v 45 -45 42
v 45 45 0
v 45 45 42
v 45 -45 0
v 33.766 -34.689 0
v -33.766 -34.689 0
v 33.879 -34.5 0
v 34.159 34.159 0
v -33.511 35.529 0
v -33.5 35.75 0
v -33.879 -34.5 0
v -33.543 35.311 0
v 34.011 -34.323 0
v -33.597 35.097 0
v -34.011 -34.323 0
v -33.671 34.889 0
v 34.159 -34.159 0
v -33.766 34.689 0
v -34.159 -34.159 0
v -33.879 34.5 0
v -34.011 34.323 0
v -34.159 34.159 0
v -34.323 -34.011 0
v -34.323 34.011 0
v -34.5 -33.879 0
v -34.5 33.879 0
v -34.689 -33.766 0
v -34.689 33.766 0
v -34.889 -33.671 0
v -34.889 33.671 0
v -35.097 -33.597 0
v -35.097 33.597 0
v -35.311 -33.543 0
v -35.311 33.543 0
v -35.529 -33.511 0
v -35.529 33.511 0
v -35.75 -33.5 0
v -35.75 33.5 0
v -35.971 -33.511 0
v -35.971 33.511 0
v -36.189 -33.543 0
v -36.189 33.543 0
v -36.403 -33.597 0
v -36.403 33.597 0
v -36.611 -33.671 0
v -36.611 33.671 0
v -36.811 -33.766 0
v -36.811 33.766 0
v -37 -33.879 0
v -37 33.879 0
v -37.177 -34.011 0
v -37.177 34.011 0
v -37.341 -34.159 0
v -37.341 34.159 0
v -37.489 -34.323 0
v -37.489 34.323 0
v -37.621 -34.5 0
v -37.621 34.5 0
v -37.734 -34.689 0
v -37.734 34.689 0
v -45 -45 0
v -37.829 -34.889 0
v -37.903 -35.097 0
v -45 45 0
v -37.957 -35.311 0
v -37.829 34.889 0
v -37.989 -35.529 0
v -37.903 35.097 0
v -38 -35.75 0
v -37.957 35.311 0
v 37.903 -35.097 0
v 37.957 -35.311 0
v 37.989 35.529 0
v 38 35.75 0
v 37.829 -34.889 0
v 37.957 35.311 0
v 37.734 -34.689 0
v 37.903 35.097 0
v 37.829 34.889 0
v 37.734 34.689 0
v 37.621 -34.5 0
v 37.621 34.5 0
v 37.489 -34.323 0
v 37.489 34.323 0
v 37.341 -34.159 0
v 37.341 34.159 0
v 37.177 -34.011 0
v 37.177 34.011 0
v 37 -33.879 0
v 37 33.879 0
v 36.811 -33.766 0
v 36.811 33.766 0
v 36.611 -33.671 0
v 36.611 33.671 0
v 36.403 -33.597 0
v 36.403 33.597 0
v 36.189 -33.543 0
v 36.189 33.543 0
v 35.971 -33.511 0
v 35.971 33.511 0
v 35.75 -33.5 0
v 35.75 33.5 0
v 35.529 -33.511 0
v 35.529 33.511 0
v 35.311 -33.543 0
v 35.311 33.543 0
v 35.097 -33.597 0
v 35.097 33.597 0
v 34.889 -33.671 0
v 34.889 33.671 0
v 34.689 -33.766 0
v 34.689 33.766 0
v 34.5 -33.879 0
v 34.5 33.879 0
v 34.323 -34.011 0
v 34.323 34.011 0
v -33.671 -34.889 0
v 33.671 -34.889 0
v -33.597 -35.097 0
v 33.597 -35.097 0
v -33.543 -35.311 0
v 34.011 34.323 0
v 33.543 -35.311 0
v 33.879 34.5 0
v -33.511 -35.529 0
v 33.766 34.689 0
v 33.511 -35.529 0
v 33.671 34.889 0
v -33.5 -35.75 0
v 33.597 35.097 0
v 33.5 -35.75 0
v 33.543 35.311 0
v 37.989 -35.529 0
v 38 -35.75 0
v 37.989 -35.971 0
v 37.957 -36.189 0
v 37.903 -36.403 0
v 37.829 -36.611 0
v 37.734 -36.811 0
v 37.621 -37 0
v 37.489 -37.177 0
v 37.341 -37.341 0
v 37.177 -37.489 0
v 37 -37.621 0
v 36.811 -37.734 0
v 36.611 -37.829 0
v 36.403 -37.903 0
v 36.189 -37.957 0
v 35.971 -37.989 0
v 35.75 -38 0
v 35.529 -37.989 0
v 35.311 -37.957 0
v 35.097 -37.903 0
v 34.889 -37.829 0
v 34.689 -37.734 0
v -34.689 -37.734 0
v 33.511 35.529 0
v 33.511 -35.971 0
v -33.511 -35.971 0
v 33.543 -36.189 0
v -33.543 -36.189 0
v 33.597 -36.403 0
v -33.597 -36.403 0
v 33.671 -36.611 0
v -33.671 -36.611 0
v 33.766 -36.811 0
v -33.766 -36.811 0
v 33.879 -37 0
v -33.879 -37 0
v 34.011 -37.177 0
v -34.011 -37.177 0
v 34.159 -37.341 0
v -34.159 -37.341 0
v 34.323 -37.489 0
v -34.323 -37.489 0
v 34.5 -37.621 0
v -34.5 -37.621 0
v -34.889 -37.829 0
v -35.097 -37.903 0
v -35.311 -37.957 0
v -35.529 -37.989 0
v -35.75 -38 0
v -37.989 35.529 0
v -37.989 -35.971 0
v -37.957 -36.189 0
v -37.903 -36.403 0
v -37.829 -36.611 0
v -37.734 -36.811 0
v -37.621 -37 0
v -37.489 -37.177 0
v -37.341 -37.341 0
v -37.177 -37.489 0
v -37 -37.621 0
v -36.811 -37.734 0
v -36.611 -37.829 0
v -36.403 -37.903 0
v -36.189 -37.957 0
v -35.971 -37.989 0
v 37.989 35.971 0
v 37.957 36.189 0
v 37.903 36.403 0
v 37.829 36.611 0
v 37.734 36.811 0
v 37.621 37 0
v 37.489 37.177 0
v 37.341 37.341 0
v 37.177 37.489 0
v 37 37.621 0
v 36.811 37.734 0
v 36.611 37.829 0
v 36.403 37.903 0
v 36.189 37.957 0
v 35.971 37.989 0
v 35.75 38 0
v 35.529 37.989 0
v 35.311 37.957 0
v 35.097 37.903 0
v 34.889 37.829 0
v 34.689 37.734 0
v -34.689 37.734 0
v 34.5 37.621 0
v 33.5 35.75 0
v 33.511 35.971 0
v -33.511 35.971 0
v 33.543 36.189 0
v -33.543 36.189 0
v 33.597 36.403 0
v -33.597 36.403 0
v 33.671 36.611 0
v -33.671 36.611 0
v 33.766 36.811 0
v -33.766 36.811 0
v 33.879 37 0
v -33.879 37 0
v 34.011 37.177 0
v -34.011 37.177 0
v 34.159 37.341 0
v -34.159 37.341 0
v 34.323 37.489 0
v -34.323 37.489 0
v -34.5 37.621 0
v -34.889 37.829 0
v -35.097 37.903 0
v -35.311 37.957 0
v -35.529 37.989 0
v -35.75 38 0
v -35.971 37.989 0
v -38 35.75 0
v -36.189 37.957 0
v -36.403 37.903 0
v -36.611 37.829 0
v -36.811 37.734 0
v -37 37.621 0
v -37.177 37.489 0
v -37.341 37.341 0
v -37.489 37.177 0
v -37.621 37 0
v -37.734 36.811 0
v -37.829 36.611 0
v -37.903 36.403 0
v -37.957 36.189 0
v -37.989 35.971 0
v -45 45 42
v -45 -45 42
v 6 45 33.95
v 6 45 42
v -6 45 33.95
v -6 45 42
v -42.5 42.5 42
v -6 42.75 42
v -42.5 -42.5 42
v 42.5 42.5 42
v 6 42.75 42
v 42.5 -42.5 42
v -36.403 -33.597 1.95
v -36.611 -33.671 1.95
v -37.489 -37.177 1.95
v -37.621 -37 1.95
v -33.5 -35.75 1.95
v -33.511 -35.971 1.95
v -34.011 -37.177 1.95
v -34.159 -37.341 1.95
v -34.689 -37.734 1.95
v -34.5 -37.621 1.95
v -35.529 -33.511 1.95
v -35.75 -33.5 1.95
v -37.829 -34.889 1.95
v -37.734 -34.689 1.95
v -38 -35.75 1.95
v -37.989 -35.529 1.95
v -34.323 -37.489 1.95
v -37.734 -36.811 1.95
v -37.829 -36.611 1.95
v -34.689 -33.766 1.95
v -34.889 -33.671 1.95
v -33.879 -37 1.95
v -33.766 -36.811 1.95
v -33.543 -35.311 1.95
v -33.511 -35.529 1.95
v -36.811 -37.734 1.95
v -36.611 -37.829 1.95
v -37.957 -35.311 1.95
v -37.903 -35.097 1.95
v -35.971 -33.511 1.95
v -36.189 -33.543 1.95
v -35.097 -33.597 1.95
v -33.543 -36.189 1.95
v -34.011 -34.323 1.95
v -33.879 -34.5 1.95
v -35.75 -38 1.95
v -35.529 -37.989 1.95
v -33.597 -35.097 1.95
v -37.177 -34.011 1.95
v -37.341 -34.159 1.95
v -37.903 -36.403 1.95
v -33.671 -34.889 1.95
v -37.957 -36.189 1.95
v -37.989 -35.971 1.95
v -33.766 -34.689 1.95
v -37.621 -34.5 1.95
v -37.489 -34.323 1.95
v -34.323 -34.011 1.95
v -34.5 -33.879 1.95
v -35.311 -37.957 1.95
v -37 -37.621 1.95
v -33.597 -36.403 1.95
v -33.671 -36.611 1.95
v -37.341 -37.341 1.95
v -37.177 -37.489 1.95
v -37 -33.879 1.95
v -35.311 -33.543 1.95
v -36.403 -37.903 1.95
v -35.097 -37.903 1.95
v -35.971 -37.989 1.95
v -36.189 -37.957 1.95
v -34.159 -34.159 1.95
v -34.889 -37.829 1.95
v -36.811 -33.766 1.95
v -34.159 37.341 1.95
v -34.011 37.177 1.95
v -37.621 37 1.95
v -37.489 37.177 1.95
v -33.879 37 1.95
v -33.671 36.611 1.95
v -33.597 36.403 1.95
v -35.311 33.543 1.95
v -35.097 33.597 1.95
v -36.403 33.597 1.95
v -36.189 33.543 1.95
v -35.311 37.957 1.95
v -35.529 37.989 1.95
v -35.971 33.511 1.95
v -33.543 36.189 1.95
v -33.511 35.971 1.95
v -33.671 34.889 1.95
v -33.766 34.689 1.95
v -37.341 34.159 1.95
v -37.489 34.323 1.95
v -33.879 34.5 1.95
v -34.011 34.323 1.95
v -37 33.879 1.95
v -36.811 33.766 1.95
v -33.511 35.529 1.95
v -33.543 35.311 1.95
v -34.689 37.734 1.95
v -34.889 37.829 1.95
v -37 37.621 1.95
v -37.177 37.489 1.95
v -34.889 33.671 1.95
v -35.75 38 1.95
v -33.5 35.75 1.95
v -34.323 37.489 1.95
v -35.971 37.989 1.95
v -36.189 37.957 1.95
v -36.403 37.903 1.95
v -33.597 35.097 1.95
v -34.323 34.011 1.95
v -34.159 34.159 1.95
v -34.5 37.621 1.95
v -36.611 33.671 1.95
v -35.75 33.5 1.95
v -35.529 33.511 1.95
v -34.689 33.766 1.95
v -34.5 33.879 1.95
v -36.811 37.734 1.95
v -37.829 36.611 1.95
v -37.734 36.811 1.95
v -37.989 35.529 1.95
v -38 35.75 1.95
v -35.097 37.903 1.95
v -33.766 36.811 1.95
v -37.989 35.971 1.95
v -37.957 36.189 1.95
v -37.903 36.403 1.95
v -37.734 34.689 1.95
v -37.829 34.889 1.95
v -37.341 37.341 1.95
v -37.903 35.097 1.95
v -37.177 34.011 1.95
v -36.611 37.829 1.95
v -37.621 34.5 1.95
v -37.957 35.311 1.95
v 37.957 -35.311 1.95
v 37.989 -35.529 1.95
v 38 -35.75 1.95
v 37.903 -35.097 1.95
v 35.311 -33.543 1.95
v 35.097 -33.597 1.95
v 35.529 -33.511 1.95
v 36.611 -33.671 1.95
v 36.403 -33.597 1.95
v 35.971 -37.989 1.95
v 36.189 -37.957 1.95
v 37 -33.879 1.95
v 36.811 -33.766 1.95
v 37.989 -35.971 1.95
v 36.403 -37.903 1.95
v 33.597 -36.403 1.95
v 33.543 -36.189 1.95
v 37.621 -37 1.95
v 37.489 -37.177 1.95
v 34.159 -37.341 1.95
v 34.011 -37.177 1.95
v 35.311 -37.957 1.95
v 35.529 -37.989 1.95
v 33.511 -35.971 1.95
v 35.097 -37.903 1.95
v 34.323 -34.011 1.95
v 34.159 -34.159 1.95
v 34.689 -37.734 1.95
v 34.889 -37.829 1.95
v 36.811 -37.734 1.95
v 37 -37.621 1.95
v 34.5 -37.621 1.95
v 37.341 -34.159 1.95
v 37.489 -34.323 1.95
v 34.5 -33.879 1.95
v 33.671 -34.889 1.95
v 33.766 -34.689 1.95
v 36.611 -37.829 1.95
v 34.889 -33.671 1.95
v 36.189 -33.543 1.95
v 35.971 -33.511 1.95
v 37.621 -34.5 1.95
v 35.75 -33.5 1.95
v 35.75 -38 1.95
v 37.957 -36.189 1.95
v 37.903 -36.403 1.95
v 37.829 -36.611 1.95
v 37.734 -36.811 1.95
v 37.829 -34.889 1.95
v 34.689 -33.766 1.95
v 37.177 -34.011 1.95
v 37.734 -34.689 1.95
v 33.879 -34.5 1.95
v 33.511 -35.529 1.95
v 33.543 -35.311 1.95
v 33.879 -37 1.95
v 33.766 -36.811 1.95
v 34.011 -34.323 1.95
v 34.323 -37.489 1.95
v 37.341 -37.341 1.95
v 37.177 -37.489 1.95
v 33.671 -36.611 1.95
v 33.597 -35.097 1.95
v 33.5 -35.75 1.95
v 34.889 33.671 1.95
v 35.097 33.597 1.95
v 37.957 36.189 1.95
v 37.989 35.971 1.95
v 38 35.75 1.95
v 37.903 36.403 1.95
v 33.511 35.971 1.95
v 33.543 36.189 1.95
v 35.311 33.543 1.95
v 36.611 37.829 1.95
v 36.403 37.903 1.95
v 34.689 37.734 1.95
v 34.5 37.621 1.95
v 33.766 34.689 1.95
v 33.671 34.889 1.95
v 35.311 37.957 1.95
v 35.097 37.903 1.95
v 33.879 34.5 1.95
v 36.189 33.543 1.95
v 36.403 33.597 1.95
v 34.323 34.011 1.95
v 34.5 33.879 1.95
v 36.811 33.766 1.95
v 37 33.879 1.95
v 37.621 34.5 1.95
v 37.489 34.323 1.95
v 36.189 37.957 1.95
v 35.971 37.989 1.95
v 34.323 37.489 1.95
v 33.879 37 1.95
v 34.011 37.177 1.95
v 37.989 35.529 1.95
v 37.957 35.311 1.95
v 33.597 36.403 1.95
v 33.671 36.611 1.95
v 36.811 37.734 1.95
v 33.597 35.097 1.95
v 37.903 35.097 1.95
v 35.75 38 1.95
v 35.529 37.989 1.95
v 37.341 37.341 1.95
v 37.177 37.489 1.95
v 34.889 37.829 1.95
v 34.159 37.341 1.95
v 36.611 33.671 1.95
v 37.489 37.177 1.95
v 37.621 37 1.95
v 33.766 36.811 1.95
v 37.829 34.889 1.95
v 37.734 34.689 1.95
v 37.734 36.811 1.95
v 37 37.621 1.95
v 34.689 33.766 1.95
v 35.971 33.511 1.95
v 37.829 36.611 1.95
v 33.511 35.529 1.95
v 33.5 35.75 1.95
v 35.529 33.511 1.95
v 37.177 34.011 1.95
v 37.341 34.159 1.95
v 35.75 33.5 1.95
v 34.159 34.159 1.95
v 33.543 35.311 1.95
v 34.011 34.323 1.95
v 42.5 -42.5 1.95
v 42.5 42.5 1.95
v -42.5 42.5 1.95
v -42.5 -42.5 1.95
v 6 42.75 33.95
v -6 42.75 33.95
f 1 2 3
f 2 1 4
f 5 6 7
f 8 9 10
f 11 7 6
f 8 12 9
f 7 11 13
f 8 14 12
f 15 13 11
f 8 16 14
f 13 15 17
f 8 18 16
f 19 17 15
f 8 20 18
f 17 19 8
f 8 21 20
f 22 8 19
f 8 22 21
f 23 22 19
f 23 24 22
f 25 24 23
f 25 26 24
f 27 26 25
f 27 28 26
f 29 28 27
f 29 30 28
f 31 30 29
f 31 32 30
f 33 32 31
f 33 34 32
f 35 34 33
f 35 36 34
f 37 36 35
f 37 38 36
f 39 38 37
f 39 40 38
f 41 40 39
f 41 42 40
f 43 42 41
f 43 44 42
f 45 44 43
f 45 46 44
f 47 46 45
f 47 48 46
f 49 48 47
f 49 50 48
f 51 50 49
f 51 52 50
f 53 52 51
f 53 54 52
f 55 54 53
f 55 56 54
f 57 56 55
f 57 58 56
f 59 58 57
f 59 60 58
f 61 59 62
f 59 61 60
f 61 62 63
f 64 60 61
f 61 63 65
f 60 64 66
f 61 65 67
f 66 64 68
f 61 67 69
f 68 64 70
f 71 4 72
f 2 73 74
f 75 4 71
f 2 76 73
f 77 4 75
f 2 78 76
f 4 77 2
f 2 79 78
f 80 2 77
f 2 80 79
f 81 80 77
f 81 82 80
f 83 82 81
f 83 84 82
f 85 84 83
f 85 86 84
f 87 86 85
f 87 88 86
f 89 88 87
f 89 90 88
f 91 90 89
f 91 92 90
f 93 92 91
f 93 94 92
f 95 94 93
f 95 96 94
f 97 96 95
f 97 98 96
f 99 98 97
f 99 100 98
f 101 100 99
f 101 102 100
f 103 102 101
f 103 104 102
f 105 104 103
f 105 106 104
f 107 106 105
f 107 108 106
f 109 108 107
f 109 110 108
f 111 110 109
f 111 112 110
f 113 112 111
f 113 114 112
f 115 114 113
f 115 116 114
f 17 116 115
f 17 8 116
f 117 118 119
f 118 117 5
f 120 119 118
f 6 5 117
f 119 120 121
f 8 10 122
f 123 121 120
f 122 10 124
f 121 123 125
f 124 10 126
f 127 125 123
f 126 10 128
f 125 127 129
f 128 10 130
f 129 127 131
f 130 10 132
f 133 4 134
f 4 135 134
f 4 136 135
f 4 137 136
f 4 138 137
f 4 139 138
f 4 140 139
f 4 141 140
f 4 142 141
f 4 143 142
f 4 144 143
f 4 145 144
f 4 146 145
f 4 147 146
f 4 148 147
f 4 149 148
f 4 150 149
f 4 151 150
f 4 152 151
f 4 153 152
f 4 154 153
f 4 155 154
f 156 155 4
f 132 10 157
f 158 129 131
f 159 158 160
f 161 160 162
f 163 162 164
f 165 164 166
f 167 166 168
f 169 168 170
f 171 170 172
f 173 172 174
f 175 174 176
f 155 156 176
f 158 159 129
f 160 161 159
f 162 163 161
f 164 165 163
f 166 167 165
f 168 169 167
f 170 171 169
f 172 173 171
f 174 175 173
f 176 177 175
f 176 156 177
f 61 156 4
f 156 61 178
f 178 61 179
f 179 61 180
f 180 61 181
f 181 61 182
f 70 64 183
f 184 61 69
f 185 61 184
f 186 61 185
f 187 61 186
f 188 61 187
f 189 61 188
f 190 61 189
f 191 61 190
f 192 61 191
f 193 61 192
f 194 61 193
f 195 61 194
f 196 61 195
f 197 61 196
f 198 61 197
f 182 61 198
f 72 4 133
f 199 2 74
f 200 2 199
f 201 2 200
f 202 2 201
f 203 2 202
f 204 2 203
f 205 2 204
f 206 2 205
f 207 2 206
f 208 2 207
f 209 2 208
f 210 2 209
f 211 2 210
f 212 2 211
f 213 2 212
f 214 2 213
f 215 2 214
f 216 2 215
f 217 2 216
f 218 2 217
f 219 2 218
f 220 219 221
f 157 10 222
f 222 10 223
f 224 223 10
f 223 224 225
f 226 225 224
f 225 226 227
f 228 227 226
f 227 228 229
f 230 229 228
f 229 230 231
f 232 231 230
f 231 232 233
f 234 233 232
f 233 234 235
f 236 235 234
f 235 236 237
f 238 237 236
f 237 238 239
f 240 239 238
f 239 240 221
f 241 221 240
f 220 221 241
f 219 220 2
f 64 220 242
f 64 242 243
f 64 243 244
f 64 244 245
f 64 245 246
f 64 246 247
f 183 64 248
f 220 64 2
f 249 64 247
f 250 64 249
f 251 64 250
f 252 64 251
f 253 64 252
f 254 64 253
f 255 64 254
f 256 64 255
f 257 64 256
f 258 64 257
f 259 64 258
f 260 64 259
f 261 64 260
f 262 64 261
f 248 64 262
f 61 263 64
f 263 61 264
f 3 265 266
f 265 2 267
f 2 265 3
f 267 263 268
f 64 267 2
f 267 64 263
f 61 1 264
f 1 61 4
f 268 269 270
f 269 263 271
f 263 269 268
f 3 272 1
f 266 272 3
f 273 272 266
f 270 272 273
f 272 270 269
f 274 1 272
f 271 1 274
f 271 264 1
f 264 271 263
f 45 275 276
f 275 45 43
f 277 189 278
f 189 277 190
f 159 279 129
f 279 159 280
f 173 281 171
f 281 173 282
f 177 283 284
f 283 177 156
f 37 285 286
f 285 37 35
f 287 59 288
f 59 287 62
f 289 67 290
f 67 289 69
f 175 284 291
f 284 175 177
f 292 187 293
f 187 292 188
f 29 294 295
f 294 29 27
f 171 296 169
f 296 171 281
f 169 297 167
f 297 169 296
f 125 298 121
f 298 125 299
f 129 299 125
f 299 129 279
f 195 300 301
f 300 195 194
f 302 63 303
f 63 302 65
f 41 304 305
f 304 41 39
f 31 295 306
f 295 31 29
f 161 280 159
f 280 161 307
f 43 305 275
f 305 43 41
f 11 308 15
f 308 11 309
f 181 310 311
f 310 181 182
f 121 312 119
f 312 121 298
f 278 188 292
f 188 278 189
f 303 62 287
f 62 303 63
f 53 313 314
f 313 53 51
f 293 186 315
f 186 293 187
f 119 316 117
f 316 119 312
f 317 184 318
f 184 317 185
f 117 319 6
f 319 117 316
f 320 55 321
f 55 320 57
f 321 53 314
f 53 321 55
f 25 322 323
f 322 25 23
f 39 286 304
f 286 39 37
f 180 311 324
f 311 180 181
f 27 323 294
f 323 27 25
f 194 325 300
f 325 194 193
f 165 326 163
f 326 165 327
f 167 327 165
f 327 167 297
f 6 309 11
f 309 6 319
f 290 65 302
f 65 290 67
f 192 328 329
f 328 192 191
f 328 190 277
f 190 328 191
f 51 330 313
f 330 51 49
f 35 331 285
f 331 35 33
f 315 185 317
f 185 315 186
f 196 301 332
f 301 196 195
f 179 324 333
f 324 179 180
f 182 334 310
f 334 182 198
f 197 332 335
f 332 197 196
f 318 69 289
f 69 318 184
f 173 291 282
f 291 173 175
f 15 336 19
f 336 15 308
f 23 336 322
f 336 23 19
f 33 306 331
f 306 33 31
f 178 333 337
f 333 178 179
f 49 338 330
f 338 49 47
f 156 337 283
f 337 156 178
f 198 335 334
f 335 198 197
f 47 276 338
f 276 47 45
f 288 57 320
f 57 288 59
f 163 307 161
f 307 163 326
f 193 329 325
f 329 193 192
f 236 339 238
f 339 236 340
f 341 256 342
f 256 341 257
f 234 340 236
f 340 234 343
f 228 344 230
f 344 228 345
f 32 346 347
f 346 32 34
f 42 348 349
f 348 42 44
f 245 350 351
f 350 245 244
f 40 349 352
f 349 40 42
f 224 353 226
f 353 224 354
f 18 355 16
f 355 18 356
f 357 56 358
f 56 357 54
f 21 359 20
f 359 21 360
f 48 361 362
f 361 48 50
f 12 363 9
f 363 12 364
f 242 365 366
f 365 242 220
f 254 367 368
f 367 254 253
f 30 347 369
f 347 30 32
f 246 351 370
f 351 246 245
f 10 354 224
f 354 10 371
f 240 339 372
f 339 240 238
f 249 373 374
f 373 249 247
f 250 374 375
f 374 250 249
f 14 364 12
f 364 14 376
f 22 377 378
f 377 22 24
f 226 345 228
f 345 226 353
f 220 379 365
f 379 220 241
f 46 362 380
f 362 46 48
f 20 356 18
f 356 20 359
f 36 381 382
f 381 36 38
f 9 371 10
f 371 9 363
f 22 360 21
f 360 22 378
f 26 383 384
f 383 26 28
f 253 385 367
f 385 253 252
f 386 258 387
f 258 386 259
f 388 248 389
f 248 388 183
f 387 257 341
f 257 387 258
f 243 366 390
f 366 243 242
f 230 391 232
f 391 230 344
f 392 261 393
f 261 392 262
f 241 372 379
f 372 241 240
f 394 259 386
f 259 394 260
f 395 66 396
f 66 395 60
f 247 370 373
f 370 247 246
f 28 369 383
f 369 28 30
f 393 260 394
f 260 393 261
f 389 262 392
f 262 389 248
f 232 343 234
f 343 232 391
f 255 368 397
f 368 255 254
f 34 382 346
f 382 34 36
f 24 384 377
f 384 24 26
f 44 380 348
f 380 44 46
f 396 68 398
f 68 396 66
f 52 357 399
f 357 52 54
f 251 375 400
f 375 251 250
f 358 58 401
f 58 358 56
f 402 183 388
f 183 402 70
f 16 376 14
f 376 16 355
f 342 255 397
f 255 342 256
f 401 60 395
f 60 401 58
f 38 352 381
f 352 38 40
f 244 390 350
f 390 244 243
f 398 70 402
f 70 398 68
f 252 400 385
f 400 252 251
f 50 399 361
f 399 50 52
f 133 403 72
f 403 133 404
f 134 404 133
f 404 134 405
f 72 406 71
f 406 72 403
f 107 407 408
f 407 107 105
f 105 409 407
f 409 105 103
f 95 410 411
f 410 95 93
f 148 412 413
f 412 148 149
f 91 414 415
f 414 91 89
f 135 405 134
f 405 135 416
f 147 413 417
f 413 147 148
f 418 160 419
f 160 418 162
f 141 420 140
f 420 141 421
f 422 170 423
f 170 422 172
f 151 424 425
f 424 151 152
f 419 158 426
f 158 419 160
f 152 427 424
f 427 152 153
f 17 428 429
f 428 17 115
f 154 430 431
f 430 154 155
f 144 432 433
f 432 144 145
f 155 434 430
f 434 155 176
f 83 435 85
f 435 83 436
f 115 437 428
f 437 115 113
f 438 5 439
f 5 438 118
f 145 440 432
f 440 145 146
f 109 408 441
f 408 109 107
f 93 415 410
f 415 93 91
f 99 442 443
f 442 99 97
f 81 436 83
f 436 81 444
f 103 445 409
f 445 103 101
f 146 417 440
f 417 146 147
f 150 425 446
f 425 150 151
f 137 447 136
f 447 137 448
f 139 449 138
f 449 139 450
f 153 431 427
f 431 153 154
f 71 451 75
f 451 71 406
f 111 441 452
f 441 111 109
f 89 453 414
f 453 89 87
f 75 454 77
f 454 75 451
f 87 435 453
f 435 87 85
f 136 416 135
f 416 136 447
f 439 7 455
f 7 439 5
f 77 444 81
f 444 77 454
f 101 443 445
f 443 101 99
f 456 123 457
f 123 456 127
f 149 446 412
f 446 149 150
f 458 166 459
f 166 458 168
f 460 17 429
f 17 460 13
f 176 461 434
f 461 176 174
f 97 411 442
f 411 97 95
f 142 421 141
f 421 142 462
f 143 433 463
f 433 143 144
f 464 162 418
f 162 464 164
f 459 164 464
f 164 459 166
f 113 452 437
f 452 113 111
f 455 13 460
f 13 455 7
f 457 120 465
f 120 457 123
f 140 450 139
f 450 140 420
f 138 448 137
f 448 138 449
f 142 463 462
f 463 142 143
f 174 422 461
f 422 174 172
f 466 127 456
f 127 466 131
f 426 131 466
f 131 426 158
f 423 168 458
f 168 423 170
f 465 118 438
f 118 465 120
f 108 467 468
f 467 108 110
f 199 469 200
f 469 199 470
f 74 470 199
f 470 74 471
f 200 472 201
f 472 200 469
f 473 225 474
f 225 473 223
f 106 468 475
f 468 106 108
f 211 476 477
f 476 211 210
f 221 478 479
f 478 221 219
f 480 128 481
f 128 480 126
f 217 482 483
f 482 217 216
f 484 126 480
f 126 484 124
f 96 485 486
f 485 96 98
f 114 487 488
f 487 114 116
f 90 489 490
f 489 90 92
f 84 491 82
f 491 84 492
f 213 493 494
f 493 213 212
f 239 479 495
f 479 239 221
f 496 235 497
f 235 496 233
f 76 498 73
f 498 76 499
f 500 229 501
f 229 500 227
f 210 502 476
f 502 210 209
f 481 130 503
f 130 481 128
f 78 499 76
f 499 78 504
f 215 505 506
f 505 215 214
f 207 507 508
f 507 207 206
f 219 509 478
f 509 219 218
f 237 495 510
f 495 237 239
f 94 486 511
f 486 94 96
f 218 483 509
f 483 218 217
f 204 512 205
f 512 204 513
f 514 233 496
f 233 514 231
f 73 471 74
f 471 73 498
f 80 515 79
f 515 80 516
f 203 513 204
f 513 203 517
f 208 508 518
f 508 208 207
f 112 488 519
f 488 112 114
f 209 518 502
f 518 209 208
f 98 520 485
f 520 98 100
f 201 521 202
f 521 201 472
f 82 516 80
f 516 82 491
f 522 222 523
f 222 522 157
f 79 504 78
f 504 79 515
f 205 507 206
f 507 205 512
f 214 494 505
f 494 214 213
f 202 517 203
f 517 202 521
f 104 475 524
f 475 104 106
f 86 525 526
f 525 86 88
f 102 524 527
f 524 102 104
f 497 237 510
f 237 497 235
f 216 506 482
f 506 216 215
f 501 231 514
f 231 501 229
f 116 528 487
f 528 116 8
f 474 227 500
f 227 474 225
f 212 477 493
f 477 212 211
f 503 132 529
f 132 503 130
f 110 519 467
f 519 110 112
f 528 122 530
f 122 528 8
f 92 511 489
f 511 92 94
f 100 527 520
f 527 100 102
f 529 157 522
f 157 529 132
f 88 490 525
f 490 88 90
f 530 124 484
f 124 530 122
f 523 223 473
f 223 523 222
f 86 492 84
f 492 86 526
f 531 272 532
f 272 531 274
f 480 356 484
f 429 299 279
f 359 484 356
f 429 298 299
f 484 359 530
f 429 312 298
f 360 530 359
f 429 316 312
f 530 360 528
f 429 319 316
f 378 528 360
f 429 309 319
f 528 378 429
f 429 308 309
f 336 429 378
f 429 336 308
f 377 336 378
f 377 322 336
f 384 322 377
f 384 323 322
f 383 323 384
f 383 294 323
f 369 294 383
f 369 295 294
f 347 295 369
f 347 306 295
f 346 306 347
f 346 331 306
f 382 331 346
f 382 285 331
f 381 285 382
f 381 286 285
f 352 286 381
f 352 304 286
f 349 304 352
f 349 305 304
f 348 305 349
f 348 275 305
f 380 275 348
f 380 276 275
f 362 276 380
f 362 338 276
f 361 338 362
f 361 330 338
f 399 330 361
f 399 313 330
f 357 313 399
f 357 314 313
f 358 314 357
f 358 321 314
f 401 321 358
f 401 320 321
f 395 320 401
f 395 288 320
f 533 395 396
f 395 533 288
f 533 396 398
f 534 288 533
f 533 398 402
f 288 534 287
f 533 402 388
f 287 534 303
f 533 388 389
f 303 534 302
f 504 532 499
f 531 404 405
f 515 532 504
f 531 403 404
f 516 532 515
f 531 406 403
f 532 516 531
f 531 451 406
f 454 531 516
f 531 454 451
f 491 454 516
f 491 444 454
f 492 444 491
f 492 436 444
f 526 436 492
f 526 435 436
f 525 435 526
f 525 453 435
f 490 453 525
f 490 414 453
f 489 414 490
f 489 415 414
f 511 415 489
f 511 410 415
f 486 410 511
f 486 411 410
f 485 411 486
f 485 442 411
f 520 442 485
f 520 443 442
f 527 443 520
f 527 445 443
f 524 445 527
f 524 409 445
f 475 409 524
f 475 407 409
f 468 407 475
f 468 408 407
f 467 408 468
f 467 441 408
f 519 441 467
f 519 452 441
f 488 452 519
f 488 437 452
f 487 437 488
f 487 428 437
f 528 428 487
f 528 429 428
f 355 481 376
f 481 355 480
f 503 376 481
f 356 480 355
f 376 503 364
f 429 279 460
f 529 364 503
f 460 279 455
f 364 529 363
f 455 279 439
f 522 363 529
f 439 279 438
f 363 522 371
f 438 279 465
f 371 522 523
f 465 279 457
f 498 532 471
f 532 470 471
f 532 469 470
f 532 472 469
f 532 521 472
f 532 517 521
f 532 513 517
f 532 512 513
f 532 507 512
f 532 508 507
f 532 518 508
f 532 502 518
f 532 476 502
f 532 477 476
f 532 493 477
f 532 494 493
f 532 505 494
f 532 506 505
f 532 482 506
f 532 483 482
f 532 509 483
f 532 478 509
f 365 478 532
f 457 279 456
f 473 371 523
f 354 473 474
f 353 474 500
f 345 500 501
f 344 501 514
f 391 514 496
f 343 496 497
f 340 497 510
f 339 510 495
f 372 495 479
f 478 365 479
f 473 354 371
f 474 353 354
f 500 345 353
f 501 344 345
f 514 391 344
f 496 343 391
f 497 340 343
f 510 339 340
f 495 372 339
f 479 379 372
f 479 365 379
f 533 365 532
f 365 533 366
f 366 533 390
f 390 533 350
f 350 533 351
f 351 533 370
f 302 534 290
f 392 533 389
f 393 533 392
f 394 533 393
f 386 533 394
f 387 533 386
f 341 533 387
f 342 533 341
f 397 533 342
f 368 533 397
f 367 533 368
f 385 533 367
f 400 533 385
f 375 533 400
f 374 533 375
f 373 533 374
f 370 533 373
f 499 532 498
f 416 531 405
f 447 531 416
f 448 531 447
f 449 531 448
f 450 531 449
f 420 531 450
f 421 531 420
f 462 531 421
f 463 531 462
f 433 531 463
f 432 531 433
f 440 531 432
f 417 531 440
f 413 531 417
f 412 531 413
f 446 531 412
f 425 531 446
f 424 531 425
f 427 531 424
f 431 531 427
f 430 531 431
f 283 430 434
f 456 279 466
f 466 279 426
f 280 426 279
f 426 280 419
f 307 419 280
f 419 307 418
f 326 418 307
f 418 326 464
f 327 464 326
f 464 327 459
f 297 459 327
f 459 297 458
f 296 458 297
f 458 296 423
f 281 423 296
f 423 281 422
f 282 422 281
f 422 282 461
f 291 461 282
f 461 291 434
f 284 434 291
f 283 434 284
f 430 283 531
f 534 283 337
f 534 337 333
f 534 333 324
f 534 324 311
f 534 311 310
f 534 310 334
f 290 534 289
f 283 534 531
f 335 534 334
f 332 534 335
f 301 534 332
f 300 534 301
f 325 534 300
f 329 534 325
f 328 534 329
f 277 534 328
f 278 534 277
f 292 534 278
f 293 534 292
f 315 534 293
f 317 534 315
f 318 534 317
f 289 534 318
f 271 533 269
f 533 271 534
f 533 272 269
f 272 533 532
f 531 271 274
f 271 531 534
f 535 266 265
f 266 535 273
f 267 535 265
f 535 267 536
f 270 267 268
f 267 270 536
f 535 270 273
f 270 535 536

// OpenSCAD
// --- Dimensions (mm) ---
outer_width = 90;          // Outer dimension of the square box (X)
outer_length = 90;         // Outer dimension of the square box (Y)
wall_thickness = 2.5;      // Thickness of the four vertical walls
top_plate_thickness = 2;   // Thickness of the top plate (the stirring surface)
total_wall_height = 40;    // Height of the walls rising from the plate
screw_hole_diameter = 4.5; // Diameter for M4 screw holes
screw_pattern_size = 71.5; // Distance between screw hole centers
notch_width = 12;          // Width of the cable notch
notch_depth = 8;           // Depth of the notch from the open edge
$fn = 64;                  // Smoothness for circular features

// --- Implementation ---
// The part is printed upside down.
// The top plate (stirring surface) lies on the bed (z = 0 to 2).
// The walls rise from the plate to z = 42 (2 + 40).

difference() {
    // 1. The Main Body (Plate + Walls)
    union() {
        // The Top Plate (Base of the box in print orientation)
        // Positioned at Z = 0 to Z = 2
        translate([0, 0, top_plate_thickness / 2])
            cube([outer_width, outer_length, top_plate_thickness], center = true);
        
        // The Four Walls
        // They start at the top of the plate (Z = 2) and rise 40mm (to Z = 42)
        // The center of the wall block is at Z = 2 + (40/2) = 22
        translate([0, 0, top_plate_thickness + (total_wall_height / 2)])
            cube([outer_width, outer_length, total_wall_height], center = true);
    }

    // 2. Subtracting the Interior (Hollowing out the box)
    // The interior starts from the top of the plate (Z=2) up to the top (Z=42)
    // We use a slightly taller cube to ensure a clean cut through the top edge.
    translate([0, 0, top_plate_thickness + (total_wall_height / 2)])
        cube([outer_width - 2 * wall_thickness, outer_length - 2 * wall_thickness, total_wall_height + 0.1], center = true);

    // 3. Screw Holes (M4)
    // Drilled through the top plate (Z = 0 to 2)
    for (x = [-1, 1], y = [-1, 1]) {
        translate([x * screw_pattern_size / 2, y * screw_pattern_size / 2, -1])
            cylinder(d = screw_hole_diameter, h = top_plate_thickness + 2);
    }

    // 4. Cable Notch
    // Located in one wall, centered along the wall.
    // Reaches 8mm down from the open edge (z = 42 down to z = 34).
    // The notch is 12mm wide (X).
    // We place it on the wall at Y = outer_length/2.
    // The notch spans Z from (42 - 8) to 42.
    // The notch is 12mm wide (X), 8mm deep (Y), and 8mm high (Z).
    // To cut through the wall at Y=45, we translate the notch to the edge.
    // The notch is centered on the wall in X and Z.
    // Z center = (42 + 34) / 2 = 38.
    translate([0, outer_length / 2, top_plate_thickness + total_wall_height - (notch_depth / 2)])
        cube([notch_width, wall_thickness + 2, notch_depth + 0.1], center = true);
}

// Verification of requirements:
// - Printed upside down: Top plate at Z=0 to 2. (Correct)
// - Outer size 90x90. (Correct)
// - Wall thickness 2.5. (Correct)
// - Top plate thickness 2. (Correct)
// - Walls rise to Z=42 (2+40). (Correct)
// - 4x 4.5mm holes on 71.5mm pattern. (Correct)
// - Notch: 12mm wide, 8mm down from open edge. (Correct)
